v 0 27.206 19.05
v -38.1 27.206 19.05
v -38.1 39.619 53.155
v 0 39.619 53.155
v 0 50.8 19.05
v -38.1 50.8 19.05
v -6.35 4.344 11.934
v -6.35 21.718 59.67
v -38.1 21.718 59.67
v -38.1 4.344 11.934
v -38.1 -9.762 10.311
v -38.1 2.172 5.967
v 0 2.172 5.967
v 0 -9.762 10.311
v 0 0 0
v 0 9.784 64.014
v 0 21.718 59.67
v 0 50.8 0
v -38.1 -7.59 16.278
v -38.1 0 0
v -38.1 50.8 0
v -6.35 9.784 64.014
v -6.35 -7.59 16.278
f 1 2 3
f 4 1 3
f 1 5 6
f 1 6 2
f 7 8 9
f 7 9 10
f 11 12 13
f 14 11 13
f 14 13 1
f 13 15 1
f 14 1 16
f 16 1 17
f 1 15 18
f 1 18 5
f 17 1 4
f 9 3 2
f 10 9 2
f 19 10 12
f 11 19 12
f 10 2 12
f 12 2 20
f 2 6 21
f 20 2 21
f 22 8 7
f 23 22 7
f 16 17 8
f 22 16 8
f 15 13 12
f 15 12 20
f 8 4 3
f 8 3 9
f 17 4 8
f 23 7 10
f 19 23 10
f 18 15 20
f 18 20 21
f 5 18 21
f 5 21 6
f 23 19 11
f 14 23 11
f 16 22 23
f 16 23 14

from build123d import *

# Parameters (mm, degrees)
F1_DEPTH = 38.1
F3_DEPTH = 12.7


with BuildPart() as f1:
    # F0 (on Right) → F1 (new body)
    with BuildSketch(Plane.YZ):
        Polygon((21.7182791012, 59.6704814199), (0, 0), (50.8, 0), (50.8, 19.05), (27.2062195284, 19.05), (39.6194235272, 53.1549976896), align=None)
    extrude(amount=-F1_DEPTH)

    # F2 (on face) → F3 (join)
    with BuildSketch(Plane(origin=(0, 0, 0), x_dir=(1, 0, 0), z_dir=(0, -0.9396926208, 0.3420201433))):
        Polygon((0, 6.35), (0, 63.5), (-6.35, 63.5), (-6.35, 12.7), (-38.1, 12.7), (-38.1, 6.35), align=None)
    extrude(amount=F3_DEPTH)


solid = f1.part
